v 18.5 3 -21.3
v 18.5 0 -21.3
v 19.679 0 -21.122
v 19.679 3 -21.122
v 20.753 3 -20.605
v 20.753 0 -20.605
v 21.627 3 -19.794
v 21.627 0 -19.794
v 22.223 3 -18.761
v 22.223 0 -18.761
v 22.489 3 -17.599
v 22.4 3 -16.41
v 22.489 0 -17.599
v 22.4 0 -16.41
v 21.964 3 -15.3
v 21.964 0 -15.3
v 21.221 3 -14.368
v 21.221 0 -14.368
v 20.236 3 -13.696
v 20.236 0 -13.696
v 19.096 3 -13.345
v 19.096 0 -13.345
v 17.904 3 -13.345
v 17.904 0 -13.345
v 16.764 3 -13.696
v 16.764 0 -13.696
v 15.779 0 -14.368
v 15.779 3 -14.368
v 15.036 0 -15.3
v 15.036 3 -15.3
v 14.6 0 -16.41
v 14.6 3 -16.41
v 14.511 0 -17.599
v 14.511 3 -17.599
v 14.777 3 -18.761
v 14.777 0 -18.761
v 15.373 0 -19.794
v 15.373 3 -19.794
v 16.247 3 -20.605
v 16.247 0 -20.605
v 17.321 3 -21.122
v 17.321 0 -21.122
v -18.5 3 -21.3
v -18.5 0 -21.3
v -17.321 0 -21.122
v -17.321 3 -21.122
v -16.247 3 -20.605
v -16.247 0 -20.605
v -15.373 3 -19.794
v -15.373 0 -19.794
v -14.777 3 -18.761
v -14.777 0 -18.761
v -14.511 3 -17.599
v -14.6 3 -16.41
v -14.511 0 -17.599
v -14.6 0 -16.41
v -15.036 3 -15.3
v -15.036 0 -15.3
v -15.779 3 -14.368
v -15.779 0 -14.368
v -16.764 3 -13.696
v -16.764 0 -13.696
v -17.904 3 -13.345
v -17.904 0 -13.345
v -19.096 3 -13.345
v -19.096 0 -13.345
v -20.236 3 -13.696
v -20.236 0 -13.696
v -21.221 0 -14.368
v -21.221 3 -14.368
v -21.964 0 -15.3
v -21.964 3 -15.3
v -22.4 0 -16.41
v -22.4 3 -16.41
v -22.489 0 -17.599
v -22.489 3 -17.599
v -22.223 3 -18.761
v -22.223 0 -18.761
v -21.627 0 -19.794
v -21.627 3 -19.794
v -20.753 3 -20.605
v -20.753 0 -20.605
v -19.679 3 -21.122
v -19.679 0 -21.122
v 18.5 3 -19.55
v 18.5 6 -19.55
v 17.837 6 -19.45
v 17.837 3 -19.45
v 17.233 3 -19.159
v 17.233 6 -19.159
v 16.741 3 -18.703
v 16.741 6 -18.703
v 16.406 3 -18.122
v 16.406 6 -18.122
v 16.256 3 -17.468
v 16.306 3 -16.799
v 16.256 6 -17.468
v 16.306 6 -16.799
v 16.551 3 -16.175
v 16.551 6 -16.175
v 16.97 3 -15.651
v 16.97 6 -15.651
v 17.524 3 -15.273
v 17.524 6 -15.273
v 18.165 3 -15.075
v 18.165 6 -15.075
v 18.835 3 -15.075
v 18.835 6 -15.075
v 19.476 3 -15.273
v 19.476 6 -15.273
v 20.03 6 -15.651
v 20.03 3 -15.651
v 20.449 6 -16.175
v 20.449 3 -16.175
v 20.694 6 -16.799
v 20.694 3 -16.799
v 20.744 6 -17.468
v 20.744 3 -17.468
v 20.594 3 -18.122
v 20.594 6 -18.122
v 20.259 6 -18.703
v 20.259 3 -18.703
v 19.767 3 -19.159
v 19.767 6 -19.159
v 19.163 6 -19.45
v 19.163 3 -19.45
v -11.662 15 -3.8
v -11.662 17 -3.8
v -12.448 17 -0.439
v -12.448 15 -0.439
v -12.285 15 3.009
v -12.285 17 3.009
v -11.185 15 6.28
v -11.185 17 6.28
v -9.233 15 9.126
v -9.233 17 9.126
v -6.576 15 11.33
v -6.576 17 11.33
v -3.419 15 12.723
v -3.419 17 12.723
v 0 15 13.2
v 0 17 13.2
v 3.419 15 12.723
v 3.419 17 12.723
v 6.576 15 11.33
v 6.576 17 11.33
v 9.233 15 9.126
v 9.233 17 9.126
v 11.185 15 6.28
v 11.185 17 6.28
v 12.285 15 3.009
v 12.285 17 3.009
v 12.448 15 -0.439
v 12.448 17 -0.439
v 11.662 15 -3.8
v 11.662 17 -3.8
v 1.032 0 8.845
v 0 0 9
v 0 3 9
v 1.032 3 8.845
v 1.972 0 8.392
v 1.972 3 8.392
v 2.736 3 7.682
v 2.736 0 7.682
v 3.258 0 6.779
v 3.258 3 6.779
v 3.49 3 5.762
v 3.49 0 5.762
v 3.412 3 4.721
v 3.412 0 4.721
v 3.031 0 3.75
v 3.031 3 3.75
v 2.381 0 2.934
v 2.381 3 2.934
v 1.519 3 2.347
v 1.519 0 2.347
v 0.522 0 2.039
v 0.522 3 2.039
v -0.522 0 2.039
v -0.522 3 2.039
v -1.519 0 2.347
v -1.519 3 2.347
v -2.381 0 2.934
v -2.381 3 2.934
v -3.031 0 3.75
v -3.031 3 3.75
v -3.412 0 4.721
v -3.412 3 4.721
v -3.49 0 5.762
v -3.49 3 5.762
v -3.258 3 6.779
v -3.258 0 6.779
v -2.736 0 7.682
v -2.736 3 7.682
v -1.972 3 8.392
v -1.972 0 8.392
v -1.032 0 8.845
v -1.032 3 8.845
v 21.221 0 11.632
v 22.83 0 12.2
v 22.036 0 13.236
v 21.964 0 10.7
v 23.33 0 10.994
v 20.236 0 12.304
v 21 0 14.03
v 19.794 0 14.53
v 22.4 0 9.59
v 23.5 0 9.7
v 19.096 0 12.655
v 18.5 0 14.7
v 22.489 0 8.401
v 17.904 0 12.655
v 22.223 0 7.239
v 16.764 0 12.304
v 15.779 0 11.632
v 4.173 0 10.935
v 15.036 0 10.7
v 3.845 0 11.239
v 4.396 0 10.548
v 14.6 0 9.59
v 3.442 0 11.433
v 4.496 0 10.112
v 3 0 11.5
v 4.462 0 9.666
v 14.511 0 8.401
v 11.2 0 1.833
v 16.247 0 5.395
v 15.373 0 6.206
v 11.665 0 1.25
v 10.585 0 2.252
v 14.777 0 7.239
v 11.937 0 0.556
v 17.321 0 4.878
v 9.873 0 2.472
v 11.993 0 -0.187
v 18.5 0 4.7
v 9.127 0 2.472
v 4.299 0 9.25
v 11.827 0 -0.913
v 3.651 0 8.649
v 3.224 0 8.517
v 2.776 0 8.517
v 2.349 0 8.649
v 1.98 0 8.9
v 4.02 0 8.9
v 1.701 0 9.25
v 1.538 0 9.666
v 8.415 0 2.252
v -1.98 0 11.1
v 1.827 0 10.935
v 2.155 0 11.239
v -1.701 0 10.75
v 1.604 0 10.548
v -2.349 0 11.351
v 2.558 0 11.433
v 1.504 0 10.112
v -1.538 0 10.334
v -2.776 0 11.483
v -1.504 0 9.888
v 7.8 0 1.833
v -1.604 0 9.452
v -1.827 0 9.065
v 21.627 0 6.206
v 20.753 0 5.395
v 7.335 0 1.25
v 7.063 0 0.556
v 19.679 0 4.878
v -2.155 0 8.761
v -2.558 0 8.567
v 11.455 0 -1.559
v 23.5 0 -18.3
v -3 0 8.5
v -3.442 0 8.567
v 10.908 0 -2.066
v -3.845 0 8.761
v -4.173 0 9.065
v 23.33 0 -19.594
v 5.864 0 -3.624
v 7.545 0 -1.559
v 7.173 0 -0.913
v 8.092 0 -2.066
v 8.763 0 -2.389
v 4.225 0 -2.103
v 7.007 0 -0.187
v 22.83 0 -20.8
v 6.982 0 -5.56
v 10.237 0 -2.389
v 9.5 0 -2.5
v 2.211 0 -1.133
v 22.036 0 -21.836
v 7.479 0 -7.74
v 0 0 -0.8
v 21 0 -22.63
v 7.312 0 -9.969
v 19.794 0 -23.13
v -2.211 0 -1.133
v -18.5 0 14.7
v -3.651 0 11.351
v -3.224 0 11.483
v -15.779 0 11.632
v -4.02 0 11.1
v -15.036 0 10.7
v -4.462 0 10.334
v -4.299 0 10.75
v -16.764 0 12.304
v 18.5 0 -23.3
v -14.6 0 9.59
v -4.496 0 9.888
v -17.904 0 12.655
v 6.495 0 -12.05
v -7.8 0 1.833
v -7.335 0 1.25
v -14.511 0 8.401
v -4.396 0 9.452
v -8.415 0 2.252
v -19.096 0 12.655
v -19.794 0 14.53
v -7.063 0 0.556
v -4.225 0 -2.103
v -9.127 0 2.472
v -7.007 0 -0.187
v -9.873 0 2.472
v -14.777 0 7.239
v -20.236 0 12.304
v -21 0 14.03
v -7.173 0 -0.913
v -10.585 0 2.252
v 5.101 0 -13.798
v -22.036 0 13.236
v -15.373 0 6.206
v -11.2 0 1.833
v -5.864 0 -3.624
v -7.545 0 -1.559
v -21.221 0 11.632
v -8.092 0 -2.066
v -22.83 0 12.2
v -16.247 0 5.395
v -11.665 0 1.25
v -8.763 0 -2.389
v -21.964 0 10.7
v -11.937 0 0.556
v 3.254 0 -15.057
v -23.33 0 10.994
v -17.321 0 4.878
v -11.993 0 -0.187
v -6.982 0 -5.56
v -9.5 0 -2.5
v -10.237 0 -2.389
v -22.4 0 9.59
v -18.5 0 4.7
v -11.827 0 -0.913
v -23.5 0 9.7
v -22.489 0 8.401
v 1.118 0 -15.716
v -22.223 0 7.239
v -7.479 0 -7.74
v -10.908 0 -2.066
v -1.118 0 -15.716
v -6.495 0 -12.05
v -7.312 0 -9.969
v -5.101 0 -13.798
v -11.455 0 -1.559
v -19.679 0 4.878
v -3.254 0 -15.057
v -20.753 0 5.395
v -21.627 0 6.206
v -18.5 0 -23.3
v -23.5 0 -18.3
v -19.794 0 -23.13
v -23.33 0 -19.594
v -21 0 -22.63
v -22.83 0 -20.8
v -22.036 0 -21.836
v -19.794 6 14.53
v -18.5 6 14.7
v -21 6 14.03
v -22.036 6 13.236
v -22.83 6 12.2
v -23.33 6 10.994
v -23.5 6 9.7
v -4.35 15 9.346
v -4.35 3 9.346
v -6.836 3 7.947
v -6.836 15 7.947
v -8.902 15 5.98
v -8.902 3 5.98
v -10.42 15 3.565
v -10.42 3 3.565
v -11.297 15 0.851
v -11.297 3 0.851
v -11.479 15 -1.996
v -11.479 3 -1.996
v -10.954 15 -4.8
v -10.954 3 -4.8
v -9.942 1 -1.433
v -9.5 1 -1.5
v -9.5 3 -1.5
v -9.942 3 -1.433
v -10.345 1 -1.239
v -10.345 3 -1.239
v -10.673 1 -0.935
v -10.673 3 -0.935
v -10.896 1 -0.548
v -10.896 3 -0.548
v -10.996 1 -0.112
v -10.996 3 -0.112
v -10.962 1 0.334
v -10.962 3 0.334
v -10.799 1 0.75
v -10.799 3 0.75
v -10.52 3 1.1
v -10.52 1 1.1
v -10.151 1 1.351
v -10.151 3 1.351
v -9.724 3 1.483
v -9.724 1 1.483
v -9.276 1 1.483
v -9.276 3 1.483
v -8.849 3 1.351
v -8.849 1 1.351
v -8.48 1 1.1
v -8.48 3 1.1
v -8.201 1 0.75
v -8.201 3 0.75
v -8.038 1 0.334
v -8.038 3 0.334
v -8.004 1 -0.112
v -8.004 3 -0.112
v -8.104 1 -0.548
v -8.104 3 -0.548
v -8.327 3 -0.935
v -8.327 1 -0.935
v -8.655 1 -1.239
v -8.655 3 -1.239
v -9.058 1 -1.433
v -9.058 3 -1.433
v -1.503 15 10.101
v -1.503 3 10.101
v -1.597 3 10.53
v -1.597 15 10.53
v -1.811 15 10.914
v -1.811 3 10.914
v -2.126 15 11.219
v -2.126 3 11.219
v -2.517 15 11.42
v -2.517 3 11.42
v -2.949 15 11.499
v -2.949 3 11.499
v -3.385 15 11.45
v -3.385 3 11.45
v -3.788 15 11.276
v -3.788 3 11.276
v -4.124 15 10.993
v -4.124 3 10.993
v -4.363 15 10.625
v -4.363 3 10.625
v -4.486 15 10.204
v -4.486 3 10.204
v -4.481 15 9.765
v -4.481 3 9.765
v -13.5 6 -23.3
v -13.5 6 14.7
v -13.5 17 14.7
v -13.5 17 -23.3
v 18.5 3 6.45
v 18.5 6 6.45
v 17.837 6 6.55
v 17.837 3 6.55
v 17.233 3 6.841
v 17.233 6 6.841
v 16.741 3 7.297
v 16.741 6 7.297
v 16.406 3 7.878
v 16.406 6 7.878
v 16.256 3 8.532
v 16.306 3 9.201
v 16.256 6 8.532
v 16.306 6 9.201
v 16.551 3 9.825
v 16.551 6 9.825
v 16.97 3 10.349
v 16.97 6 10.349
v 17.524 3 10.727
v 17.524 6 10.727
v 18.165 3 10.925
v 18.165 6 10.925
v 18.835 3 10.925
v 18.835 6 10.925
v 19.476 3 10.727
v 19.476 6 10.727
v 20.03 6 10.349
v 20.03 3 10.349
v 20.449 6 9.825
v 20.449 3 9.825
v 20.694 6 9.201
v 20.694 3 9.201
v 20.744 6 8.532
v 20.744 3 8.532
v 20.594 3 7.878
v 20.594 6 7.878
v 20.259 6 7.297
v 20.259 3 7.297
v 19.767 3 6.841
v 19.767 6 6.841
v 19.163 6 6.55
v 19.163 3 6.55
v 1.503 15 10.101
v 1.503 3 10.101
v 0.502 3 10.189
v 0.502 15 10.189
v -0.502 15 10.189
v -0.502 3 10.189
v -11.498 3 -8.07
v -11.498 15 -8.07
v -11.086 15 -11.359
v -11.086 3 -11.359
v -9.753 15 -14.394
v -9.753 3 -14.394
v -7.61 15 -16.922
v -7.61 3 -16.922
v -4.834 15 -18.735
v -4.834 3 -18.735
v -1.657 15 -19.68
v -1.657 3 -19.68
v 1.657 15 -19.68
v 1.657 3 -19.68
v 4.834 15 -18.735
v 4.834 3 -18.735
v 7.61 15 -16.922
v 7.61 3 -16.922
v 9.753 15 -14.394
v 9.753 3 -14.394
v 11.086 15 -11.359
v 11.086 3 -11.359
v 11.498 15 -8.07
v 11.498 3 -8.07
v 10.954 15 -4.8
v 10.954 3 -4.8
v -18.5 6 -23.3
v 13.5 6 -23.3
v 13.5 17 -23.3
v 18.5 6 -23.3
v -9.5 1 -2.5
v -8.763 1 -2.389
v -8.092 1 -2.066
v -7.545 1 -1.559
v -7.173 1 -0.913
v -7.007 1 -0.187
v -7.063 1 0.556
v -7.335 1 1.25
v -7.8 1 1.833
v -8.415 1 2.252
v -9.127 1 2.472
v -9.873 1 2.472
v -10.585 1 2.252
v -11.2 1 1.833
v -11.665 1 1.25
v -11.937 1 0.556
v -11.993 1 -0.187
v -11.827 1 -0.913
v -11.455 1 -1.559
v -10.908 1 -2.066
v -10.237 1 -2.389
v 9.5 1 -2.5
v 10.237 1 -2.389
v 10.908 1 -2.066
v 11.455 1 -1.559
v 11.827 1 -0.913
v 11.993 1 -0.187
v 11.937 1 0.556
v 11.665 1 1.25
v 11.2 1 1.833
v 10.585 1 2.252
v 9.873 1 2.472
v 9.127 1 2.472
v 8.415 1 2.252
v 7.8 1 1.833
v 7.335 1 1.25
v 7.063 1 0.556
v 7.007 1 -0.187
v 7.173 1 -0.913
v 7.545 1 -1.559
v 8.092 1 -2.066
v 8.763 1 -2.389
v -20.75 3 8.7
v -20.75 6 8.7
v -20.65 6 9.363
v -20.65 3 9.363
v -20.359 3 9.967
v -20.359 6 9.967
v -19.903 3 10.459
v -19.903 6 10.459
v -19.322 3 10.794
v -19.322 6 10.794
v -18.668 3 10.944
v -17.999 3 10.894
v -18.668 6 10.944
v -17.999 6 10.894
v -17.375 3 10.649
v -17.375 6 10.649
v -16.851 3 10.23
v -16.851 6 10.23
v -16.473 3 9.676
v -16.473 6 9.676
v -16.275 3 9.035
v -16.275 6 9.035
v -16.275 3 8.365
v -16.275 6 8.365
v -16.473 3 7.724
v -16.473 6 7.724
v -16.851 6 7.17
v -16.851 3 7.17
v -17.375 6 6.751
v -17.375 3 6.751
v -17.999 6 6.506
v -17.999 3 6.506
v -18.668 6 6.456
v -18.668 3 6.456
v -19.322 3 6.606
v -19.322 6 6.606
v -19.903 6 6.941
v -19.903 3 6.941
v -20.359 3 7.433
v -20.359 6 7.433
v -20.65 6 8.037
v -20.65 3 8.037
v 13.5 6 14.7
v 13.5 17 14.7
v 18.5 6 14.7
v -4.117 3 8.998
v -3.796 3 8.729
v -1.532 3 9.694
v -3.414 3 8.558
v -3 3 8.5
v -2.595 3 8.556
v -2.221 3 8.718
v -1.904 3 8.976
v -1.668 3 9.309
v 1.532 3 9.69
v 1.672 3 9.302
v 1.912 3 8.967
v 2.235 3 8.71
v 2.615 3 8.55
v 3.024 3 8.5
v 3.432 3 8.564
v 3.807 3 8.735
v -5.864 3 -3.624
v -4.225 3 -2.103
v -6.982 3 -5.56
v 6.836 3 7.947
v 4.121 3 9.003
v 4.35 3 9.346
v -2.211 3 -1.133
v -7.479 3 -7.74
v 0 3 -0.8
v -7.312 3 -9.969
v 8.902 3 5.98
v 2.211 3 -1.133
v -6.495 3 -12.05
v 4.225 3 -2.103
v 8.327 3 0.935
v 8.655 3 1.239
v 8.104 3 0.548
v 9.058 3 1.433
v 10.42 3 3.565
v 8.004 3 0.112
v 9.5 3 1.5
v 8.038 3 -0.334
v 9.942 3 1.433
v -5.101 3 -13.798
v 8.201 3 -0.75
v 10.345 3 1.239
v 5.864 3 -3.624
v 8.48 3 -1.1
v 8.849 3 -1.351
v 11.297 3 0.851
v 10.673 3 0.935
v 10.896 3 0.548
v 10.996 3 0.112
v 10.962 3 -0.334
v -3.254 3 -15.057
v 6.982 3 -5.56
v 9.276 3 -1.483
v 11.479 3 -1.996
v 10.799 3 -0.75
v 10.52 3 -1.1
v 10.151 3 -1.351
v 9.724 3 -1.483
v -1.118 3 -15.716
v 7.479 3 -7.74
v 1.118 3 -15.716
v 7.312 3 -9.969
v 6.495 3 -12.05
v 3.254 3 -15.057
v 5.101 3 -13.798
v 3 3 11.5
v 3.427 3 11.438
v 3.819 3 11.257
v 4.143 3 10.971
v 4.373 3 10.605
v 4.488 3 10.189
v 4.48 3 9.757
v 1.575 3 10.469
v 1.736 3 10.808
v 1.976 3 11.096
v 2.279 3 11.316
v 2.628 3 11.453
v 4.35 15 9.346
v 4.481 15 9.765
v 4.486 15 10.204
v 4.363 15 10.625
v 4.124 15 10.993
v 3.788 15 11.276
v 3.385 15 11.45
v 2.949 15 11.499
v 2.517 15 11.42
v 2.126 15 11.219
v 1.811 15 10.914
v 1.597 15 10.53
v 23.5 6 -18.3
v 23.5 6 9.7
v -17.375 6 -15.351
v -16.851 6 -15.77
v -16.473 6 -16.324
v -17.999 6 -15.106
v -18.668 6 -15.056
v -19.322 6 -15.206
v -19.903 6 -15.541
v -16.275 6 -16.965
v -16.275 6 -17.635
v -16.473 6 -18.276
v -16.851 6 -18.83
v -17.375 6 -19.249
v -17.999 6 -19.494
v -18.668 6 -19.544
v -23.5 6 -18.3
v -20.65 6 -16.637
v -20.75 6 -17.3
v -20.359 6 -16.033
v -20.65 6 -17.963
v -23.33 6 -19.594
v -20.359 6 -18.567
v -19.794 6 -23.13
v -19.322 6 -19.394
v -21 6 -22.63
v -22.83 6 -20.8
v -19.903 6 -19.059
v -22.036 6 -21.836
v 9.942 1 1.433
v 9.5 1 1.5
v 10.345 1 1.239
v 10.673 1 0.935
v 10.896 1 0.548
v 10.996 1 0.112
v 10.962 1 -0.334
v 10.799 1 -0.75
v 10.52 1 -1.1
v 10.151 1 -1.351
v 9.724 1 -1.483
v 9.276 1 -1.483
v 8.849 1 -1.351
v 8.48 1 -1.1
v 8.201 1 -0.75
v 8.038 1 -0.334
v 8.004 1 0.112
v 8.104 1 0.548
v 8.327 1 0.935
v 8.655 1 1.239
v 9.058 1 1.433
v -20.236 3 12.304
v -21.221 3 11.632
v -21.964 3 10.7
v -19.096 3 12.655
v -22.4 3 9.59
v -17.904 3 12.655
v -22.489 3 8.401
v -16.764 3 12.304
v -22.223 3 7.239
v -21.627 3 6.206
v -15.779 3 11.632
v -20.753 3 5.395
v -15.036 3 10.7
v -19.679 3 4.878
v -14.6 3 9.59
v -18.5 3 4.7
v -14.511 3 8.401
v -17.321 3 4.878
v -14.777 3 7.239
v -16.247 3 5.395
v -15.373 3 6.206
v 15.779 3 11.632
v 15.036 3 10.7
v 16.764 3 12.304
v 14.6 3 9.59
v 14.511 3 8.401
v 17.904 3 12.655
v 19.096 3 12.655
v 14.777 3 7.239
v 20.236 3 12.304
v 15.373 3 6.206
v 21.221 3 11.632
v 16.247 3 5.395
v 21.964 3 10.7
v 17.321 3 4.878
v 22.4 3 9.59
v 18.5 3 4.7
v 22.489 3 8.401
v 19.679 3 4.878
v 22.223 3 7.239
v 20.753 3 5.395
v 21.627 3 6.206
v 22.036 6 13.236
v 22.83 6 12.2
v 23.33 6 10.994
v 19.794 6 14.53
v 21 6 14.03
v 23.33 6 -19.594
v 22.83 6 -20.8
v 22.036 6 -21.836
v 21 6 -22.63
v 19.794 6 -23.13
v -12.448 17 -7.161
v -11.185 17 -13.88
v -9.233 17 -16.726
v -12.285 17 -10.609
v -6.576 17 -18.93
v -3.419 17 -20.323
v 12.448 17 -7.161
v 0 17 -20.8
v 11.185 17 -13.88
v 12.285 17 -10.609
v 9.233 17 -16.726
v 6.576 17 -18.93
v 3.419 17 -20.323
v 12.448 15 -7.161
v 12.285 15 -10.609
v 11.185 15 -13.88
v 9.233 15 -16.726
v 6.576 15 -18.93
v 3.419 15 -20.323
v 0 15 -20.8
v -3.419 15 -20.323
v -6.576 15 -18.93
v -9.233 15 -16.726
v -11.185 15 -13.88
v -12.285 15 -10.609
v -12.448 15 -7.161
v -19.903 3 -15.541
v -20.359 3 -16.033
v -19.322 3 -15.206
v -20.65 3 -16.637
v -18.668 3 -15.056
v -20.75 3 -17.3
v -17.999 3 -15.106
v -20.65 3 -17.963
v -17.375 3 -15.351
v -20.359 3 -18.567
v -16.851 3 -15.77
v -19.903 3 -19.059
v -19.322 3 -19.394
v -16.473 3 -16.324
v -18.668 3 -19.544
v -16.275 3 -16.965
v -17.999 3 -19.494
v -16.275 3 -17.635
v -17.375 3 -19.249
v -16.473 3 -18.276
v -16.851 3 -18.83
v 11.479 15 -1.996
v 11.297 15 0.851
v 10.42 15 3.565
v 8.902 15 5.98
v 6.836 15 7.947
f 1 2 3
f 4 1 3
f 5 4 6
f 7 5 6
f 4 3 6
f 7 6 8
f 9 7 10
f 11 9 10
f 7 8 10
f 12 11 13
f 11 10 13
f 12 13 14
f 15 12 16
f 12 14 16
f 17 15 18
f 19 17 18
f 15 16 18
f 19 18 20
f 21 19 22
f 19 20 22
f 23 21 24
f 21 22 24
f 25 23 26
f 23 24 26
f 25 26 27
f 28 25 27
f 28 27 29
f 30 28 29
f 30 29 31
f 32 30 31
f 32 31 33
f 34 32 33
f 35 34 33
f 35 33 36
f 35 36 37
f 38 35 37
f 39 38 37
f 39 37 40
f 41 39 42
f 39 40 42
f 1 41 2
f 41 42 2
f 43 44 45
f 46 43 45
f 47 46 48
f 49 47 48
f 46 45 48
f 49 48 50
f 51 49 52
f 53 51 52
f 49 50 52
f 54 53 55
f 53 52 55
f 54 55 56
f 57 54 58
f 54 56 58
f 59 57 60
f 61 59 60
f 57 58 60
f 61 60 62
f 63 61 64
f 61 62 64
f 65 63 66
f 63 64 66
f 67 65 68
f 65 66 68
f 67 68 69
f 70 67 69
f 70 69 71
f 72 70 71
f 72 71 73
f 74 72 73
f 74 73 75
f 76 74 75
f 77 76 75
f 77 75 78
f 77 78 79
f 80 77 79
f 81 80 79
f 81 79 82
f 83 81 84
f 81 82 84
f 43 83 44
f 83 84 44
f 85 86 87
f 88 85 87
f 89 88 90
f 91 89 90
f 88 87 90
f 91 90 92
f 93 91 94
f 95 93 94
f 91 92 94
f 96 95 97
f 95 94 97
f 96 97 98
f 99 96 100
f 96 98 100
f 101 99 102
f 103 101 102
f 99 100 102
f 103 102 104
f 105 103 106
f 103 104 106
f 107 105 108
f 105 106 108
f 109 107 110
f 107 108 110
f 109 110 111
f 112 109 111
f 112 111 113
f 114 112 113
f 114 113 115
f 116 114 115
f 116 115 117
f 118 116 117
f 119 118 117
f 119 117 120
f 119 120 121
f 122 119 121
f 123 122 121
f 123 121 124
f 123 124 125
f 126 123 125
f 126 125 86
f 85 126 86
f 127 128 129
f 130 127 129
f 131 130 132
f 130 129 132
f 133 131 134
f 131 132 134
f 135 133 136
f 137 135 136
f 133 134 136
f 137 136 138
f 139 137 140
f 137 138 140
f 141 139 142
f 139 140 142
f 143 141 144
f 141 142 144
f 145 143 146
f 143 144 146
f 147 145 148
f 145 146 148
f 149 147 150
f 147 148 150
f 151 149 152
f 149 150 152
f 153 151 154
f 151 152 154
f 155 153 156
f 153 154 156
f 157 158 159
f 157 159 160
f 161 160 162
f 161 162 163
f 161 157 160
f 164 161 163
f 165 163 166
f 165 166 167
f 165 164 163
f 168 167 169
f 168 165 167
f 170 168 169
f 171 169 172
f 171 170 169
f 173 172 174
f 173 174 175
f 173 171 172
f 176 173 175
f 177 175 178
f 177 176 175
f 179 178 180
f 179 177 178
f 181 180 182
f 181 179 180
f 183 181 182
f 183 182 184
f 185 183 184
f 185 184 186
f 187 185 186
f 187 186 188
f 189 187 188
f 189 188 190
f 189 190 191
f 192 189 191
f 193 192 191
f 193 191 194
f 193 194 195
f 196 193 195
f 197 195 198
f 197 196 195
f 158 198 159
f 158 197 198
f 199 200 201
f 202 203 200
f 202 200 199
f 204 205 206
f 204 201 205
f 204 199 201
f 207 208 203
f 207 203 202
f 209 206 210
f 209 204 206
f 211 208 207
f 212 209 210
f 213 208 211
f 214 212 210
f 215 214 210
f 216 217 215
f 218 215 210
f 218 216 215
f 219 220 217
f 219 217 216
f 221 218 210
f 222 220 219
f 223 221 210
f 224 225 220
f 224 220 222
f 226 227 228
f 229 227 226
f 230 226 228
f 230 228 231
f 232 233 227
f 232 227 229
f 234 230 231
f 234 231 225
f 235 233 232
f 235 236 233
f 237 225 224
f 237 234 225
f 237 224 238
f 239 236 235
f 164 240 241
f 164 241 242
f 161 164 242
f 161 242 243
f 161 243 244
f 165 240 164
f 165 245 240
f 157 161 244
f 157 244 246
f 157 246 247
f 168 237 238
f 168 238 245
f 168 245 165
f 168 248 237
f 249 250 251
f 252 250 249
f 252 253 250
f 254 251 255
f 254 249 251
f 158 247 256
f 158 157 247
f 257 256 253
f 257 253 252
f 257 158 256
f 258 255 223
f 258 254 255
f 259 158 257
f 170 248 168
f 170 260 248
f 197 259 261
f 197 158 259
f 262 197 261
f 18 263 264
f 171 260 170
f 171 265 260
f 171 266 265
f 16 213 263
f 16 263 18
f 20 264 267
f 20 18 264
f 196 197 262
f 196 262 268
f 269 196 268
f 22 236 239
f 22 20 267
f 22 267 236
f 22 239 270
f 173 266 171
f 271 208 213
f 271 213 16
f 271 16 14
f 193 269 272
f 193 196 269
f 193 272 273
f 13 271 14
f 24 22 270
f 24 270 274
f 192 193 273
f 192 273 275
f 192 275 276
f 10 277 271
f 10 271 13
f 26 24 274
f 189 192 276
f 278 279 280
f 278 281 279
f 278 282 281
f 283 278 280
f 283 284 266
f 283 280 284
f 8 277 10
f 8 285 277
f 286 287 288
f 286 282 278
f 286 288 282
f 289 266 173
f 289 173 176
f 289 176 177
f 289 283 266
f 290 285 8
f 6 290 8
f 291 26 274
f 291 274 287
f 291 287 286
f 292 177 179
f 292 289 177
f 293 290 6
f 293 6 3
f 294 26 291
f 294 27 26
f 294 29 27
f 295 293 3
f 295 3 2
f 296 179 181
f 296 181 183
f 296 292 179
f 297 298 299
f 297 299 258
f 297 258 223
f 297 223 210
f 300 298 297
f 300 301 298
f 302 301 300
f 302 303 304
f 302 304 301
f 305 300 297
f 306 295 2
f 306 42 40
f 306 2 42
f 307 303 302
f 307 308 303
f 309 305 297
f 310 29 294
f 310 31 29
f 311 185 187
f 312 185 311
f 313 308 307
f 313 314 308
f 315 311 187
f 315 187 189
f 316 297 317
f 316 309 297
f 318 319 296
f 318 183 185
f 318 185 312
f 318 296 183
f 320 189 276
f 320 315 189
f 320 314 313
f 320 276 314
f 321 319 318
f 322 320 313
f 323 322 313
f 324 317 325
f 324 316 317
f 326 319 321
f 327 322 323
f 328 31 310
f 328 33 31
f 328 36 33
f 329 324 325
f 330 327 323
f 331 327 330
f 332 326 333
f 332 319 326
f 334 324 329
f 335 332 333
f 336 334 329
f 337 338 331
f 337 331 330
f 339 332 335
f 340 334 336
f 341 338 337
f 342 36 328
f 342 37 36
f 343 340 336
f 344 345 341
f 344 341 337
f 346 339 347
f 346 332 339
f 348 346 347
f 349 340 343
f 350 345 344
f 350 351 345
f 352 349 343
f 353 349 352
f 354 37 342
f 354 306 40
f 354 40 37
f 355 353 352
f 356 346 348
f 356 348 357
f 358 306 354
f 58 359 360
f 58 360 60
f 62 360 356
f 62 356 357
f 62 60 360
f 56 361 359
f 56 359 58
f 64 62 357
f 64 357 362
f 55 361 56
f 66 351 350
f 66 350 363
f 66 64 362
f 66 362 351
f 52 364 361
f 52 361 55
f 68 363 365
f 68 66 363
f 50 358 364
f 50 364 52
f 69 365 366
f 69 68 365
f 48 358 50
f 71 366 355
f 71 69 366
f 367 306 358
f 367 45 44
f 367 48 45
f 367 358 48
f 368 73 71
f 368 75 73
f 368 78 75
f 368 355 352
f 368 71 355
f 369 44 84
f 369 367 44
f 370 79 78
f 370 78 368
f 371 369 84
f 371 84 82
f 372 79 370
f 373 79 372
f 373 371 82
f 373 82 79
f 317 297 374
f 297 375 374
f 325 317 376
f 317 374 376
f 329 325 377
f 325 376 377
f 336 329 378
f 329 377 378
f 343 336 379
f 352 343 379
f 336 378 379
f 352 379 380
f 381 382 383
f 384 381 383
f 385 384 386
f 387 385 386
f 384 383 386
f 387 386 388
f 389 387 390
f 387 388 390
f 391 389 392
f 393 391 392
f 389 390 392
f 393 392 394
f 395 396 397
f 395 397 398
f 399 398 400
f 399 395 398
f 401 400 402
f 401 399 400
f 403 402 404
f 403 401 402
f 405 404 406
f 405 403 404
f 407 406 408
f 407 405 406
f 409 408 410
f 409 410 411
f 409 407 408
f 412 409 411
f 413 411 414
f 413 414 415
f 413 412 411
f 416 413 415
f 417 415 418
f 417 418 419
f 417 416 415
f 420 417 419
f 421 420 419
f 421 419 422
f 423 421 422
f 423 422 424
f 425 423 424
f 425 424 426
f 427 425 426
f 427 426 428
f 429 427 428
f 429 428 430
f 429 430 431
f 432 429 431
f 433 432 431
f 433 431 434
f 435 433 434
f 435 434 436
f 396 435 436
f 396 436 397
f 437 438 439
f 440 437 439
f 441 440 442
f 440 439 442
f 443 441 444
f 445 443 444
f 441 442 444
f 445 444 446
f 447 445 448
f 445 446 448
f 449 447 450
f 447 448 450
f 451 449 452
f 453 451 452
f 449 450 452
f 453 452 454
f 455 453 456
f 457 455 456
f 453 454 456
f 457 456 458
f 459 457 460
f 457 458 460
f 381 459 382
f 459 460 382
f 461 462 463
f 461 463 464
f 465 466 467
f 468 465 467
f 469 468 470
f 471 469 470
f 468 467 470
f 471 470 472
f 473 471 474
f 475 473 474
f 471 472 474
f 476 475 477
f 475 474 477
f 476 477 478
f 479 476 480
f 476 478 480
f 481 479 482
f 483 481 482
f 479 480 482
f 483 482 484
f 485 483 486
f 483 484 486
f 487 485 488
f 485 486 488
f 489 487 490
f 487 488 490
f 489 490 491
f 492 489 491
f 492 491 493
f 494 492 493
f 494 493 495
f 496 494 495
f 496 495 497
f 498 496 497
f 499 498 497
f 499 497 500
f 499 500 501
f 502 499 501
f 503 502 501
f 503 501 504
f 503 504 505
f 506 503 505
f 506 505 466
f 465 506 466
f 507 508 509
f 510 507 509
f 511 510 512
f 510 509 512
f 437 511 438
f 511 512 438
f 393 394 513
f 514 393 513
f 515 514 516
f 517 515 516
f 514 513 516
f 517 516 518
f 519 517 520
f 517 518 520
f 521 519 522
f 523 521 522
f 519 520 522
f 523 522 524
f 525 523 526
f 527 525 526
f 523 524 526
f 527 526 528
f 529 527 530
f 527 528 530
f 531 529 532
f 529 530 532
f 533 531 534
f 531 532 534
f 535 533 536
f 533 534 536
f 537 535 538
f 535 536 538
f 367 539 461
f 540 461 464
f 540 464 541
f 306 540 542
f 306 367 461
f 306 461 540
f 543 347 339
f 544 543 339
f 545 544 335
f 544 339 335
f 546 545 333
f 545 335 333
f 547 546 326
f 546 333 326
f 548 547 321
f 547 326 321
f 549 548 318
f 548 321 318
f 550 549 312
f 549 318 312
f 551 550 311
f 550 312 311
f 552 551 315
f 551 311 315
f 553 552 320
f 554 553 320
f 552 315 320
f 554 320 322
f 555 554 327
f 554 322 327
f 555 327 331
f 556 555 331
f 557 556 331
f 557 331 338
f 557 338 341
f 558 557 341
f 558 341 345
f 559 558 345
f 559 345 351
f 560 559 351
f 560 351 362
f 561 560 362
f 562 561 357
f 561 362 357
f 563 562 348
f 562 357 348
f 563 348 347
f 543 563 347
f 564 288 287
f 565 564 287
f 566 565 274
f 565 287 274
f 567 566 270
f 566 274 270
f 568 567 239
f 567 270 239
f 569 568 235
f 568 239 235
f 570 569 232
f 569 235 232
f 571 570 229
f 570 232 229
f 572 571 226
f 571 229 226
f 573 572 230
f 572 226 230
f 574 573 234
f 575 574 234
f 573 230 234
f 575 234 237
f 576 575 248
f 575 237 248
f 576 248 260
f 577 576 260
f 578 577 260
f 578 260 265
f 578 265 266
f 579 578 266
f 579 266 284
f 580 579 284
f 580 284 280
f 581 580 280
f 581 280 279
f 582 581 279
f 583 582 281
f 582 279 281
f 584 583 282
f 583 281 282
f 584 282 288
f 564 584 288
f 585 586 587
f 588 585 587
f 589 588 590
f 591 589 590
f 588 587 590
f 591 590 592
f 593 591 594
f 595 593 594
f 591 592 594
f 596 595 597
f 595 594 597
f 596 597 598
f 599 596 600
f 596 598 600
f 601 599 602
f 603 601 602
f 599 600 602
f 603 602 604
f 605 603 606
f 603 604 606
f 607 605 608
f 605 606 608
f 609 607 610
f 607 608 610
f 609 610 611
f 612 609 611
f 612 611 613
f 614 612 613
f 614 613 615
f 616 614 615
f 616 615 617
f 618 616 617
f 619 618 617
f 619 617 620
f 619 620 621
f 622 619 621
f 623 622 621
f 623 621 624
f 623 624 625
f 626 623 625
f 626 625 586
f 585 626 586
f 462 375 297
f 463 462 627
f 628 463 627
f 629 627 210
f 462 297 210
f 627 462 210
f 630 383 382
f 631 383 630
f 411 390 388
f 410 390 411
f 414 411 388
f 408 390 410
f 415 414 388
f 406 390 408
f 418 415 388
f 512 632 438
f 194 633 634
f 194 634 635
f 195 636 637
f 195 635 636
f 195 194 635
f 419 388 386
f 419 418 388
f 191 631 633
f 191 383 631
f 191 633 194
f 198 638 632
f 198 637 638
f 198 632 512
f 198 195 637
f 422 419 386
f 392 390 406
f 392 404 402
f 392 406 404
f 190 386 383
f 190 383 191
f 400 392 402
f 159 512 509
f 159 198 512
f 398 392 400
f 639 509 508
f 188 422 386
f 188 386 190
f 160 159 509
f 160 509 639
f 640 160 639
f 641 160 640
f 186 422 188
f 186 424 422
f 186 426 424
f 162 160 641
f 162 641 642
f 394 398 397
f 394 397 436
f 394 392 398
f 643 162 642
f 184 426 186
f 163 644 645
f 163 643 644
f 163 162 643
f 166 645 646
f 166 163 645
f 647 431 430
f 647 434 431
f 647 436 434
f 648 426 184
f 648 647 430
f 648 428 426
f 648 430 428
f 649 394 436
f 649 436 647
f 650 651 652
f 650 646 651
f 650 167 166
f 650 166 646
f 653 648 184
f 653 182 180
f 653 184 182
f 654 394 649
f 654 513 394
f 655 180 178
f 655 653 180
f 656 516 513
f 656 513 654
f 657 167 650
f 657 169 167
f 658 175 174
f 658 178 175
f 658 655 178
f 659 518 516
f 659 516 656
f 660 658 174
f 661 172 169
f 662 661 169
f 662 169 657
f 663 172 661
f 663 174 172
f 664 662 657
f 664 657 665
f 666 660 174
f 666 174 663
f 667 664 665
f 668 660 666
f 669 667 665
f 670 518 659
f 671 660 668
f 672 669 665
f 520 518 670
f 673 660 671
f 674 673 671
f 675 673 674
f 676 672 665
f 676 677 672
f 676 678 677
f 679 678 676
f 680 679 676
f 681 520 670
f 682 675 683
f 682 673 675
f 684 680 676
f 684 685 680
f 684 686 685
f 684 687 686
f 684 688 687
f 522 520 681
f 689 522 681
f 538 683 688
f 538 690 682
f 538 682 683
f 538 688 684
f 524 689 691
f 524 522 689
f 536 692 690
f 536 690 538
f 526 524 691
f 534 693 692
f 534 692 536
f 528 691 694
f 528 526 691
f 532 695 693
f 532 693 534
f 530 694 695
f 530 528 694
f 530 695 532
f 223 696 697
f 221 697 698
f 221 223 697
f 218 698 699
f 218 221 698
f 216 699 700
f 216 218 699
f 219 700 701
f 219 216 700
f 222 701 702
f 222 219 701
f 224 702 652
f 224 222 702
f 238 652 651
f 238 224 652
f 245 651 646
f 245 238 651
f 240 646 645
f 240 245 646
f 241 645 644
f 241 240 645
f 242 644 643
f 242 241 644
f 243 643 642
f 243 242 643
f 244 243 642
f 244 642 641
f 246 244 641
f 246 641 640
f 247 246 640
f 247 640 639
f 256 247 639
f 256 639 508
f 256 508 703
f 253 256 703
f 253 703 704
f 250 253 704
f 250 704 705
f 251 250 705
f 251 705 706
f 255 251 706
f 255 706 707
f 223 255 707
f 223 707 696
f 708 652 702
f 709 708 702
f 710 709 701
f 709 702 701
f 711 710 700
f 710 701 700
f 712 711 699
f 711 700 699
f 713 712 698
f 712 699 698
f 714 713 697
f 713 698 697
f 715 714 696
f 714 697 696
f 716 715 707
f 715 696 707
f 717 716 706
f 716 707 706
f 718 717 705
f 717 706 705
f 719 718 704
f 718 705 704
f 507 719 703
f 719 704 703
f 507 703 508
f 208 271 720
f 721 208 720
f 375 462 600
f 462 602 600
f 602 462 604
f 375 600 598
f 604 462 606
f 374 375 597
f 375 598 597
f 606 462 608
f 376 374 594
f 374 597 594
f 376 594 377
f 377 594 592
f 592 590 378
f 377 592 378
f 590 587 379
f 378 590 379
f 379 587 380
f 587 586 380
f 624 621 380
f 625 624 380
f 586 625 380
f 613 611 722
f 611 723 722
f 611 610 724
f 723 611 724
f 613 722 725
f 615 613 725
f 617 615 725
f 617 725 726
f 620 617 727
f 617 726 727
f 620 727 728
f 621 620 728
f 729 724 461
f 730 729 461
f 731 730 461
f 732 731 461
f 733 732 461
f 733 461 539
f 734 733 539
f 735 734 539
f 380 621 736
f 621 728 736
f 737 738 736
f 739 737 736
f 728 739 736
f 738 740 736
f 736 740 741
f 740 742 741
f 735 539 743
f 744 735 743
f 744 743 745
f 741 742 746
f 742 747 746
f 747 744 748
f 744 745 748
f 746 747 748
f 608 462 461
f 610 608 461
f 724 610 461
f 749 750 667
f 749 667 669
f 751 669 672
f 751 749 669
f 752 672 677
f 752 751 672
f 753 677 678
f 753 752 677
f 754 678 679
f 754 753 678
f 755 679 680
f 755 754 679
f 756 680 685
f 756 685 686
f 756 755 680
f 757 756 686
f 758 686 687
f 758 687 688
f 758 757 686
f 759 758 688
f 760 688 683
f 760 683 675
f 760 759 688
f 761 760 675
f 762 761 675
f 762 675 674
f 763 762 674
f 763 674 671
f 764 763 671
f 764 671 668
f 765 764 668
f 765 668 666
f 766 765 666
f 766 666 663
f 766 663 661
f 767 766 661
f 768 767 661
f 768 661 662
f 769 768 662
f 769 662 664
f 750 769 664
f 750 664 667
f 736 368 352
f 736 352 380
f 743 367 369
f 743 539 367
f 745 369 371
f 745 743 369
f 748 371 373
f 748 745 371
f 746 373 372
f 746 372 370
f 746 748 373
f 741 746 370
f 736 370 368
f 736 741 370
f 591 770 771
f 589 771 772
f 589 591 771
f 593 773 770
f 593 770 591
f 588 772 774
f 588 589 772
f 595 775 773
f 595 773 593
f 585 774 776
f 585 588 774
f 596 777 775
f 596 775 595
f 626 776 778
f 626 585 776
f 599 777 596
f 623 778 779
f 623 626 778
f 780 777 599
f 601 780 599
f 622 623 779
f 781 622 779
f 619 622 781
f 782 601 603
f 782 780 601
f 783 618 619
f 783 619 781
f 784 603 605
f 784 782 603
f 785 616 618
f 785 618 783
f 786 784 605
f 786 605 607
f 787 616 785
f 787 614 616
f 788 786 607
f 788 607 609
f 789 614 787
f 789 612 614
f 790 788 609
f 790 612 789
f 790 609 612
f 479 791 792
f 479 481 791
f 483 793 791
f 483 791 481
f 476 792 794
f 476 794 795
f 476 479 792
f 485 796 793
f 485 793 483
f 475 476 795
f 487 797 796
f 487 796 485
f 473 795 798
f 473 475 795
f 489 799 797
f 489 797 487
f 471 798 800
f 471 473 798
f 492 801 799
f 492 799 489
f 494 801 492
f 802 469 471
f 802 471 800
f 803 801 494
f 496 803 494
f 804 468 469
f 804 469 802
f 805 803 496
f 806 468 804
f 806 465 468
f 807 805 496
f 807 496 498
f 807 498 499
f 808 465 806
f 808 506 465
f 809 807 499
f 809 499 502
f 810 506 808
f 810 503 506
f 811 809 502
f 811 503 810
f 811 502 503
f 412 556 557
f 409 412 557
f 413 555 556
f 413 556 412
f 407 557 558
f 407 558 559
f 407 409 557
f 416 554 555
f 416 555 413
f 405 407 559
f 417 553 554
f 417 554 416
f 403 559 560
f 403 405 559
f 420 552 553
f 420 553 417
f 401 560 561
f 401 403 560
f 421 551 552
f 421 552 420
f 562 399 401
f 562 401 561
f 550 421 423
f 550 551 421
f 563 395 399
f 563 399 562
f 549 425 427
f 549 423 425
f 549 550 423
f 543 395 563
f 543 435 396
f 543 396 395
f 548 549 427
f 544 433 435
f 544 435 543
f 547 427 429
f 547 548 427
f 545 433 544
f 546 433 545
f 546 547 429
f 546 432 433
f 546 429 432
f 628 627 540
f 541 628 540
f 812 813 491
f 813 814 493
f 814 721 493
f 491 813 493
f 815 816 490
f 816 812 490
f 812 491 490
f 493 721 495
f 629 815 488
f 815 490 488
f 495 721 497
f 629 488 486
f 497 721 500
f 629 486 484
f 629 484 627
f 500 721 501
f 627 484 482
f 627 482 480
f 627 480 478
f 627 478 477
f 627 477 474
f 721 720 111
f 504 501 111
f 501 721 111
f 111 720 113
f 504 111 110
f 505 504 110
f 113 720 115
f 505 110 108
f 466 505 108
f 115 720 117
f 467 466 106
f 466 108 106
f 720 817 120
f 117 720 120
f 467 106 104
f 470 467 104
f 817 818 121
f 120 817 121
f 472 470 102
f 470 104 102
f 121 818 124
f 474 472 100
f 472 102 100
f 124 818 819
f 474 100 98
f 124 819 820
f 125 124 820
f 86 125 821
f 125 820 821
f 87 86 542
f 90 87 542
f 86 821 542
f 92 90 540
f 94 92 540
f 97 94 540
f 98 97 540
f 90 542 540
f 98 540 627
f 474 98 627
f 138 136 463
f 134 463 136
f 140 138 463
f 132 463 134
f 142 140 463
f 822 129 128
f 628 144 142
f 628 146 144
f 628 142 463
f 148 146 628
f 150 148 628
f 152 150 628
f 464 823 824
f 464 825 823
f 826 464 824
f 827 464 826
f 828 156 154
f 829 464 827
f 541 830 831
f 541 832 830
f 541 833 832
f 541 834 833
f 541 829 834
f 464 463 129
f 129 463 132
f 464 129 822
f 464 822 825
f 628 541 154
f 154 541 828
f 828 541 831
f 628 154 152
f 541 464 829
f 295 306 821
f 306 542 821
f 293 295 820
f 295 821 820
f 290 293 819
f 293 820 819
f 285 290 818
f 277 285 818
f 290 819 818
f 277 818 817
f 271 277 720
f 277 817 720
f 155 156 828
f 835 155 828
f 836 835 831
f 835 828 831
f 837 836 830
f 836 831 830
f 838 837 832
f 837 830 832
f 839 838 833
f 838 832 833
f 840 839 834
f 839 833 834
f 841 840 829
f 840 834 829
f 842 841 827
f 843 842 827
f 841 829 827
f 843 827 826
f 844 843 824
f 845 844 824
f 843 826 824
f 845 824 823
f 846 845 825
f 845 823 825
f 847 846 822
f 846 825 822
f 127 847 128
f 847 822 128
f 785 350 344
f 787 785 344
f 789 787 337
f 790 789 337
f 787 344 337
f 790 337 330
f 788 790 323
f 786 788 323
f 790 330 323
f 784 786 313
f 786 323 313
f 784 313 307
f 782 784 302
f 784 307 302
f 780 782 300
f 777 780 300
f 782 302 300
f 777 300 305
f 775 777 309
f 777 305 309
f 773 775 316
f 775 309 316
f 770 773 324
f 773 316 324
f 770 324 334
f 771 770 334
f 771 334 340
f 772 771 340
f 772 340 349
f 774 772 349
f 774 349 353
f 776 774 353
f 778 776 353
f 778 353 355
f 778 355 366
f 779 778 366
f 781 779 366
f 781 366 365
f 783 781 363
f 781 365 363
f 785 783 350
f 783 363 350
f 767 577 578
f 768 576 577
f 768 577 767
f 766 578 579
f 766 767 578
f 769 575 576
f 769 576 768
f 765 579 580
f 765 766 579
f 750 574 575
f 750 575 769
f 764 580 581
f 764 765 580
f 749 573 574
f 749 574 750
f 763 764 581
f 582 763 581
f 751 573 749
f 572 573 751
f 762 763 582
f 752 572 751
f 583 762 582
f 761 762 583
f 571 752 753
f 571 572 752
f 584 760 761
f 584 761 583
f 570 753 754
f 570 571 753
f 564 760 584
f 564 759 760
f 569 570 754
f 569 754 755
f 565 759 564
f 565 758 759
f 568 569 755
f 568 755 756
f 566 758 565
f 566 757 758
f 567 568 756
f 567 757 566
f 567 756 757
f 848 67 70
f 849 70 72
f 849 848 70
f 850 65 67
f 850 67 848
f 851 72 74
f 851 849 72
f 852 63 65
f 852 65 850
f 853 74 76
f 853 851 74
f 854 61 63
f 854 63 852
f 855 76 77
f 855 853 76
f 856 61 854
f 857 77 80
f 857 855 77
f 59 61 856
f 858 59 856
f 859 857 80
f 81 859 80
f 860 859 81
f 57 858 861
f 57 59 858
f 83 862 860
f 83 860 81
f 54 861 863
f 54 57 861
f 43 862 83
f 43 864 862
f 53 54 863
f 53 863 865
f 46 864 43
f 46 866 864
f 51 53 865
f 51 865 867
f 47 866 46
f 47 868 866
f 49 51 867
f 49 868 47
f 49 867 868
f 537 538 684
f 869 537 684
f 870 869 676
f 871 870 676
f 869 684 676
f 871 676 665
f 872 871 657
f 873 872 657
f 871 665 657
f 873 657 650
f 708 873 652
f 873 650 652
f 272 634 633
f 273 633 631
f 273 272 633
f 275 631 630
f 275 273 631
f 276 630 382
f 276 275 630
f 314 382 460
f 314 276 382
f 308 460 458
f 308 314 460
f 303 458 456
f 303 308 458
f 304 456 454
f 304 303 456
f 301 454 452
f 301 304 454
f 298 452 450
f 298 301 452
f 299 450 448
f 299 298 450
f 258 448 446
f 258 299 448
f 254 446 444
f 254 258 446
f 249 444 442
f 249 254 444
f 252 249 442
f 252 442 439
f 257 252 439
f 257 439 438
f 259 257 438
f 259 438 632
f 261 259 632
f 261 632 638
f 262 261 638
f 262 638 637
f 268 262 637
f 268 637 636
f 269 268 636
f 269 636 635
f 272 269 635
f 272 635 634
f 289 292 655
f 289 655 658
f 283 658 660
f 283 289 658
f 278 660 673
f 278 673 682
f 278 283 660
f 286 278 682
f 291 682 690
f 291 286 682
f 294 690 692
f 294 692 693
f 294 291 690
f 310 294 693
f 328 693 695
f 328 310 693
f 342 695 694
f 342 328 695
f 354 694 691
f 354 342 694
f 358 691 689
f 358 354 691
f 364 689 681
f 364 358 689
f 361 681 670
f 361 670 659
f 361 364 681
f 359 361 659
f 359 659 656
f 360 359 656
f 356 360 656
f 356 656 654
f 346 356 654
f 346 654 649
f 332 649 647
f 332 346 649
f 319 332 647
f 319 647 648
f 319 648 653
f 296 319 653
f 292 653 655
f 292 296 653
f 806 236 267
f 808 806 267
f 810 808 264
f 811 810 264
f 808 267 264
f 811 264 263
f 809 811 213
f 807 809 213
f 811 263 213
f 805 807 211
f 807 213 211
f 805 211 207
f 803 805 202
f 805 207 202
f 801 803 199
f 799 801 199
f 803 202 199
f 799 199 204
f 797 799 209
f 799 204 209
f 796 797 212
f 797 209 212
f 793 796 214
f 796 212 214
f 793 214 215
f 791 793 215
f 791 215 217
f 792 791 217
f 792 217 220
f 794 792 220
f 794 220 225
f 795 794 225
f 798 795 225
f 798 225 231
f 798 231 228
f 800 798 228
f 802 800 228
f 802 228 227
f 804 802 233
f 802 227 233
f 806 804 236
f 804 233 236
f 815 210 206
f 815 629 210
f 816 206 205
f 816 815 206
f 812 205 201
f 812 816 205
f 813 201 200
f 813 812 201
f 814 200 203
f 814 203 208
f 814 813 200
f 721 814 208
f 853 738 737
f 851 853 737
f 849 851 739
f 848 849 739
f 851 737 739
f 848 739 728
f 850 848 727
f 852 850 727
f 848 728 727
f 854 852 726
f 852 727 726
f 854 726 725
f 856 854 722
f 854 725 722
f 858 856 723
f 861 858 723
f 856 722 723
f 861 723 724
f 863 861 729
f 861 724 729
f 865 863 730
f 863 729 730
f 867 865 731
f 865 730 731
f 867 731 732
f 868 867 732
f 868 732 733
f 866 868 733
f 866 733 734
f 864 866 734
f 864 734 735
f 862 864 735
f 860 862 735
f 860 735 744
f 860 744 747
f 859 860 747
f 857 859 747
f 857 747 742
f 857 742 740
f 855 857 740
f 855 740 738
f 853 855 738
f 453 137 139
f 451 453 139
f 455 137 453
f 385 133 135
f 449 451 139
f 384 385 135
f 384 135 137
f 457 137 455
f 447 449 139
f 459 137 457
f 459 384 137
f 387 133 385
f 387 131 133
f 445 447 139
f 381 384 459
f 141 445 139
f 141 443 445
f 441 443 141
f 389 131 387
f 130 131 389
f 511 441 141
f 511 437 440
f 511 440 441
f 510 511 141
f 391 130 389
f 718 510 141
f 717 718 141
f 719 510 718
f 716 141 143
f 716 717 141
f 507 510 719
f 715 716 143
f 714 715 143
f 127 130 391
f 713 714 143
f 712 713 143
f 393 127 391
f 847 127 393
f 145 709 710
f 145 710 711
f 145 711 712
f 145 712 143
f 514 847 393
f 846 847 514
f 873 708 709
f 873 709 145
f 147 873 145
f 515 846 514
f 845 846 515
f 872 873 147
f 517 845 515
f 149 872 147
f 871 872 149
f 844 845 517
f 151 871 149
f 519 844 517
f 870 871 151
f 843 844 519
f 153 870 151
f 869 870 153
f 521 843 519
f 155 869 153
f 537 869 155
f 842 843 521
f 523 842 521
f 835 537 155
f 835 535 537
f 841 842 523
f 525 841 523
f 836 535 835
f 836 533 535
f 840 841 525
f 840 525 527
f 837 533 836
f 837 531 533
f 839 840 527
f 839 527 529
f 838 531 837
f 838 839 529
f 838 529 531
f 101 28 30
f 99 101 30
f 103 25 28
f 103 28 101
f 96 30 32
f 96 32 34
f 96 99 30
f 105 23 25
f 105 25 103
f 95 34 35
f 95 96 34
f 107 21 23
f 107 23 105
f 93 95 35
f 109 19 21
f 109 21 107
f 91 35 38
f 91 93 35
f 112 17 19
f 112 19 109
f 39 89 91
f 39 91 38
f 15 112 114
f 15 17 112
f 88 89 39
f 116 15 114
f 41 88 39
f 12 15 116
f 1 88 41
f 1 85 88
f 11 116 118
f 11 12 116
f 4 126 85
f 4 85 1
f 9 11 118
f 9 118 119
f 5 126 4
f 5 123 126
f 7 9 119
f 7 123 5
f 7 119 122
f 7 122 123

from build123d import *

# Parameters (mm, degrees)
SKETCH_1_W          = 27
SKETCH_1_H          = 38
SKETCH_1_R          = 7.5
SKETCH_1_R_2        = 3.5
SKETCH_1_R_3        = 1.5
EXTRUDE_1_DEPTH     = 3
SKETCH_4_W          = 10
SKETCH_4_H          = 6
EXTRUDE_3_DEPTH     = 38
SKETCH_6_R          = 2.5
CUT_EXTRUDE_3_DEPTH = 1
EXTRUDE_4_OUTLINE_W = 27
EXTRUDE_4_OUTLINE_H = 38
EXTRUDE_4_DEPTH     = 14
SKETCH_13_R         = 2.25
CUT_EXTRUDE_6_DEPTH = 10
CUT_EXTRUDE_8_DEPTH = 2
FILLET_1_R          = 5
SKETCH_17_R         = 4
CUT_EXTRUDE_9_DEPTH = 3


# Read off the part's stored shape, not the designer's step: 凸台-拉伸4
with BuildPart() as part:
    # 草图1 → 凸台-拉伸1 (new body)
    with BuildSketch(Plane(origin=(0, 0, 0), x_dir=(1, 0, 0), z_dir=(0, 1, 0))):
        with Locations((0, 4.3)):
            Rectangle(SKETCH_1_W, SKETCH_1_H)
        with Locations(Location((0, 8.3, 0), (0, 0, 270))):
            Circle(SKETCH_1_R, mode=Mode.SUBTRACT)
        with Locations(Location((0, -5.5, 0), (0, 0, 270))):
            Circle(SKETCH_1_R_2, mode=Mode.SUBTRACT)
        with Locations(Location((-9.5, 0, 0), (0, 0, 90))):
            Circle(SKETCH_1_R_3, mode=Mode.SUBTRACT)
        with Locations(Location((-3, -10, 0), (0, 0, 90))):
            Circle(SKETCH_1_R_3, mode=Mode.SUBTRACT)
        with Locations(Location((9.5, 0, 0), (0, 0, 270))):
            Circle(SKETCH_1_R_3, mode=Mode.SUBTRACT)
        with Locations(Location((3, -10, 0), (0, 0, 270))):
            Circle(SKETCH_1_R_3, mode=Mode.SUBTRACT)
    extrude(amount=EXTRUDE_1_DEPTH)

    # 草图4 → 凸台-拉伸3 (add)
    with BuildSketch(Plane(origin=(0, 0, -23.3), x_dir=(-1, 0, 0), z_dir=(0, 0, -1))):
        with Locations((-18.5, 3)):
            Rectangle(SKETCH_4_W, SKETCH_4_H)
        with Locations((18.5, 3)):
            Rectangle(SKETCH_4_W, SKETCH_4_H)
    extrude(amount=-EXTRUDE_3_DEPTH)

    # 草图6 → 切除-拉伸3 (cut)
    with BuildSketch(Plane.XZ):
        with Locations(Location((-9.5, 0, 0), (0, 0, 270))):
            Circle(SKETCH_6_R)
        with Locations(Location((9.5, 0, 0), (0, 0, 270))):
            Circle(SKETCH_6_R)
    extrude(amount=-CUT_EXTRUDE_3_DEPTH, mode=Mode.SUBTRACT)

    # 凸台-拉伸4 outline → 凸台-拉伸4 (add)
    with BuildSketch(Plane(origin=(0, 3, 0), x_dir=(1, 0, 0), z_dir=(0, 1, 0))):
        with Locations((0, 4.3)):
            Rectangle(EXTRUDE_4_OUTLINE_W, EXTRUDE_4_OUTLINE_H)
        with BuildLine():
            ThreePointArc((-1.503424688, -10.10130318), (-3.38489666, -11.449777418), (-4.349746722, -9.345642463))
            ThreePointArc((-4.349746722, -9.345642463), (-10.420144831, -3.565242203), (-10.95445115, 4.8))
            ThreePointArc((-10.95445115, 4.8), (0, 19.8), (10.95445115, 4.8))
            ThreePointArc((10.95445115, 4.8), (10.420144831, -3.565242203), (4.349746722, -9.345642463))
            ThreePointArc((4.349746722, -9.345642463), (3.38489666, -11.449777418), (1.503424688, -10.10130318))
            ThreePointArc((1.503424688, -10.10130318), (0, -10.2), (-1.503424688, -10.10130318))
        make_face(mode=Mode.SUBTRACT)
    extrude(amount=EXTRUDE_4_DEPTH)

    # 草图13 → 切除-拉伸6 (cut)
    with BuildSketch(Plane(origin=(0, 6, 0), x_dir=(1, 0, 0), z_dir=(0, 1, 0))):
        with Locations(Location((-18.5, 17.3, 0), (0, 0, 180))):
            Circle(SKETCH_13_R)
        with Locations(Location((-18.5, -8.7, 0), (0, 0, 180))):
            Circle(SKETCH_13_R)
        with Locations(Location((18.5, -8.7, 0), (0, 0, 90))):
            Circle(SKETCH_13_R)
        with Locations(Location((18.5, 17.3, 0), (0, 0, 90))):
            Circle(SKETCH_13_R)
    extrude(amount=-CUT_EXTRUDE_6_DEPTH, mode=Mode.SUBTRACT)

    # 草图15 → 切除-拉伸8 (cut)
    with BuildSketch(Plane(origin=(0, 17, 0), x_dir=(1, 0, 0), z_dir=(0, 1, 0))):
        with BuildLine():
            ThreePointArc((11.66190379, 3.8), (0, 20.8), (-11.66190379, 3.8))
            ThreePointArc((-11.66190379, 3.8), (0, -13.2), (11.66190379, 3.8))
        make_face()
    extrude(amount=-CUT_EXTRUDE_8_DEPTH, mode=Mode.SUBTRACT)

    # 圆角1
    fillet_1_edges = [part.edges().sort_by_distance(p)[0] for p in [
        (23.5, 3, -23.3),
        (23.5, 3, 14.7),
        (-23.5, 3, -23.3),
        (-23.5, 3, 14.7),
    ]]
    fillet(fillet_1_edges, radius=FILLET_1_R)

    # 草图17 → 切除-拉伸9 (cut)
    with BuildSketch(Plane.XZ):
        with Locations(Location((-18.5, 8.7, 0), (0, 0, 270))):
            Circle(SKETCH_17_R)
        with Locations(Location((18.5, 8.7, 0), (0, 0, 270))):
            Circle(SKETCH_17_R)
        with Locations(Location((18.5, -17.3, 0), (0, 0, 270))):
            Circle(SKETCH_17_R)
        with Locations(Location((-18.5, -17.3, 0), (0, 0, 270))):
            Circle(SKETCH_17_R)
    extrude(amount=-CUT_EXTRUDE_9_DEPTH, mode=Mode.SUBTRACT)


solid = part.part
